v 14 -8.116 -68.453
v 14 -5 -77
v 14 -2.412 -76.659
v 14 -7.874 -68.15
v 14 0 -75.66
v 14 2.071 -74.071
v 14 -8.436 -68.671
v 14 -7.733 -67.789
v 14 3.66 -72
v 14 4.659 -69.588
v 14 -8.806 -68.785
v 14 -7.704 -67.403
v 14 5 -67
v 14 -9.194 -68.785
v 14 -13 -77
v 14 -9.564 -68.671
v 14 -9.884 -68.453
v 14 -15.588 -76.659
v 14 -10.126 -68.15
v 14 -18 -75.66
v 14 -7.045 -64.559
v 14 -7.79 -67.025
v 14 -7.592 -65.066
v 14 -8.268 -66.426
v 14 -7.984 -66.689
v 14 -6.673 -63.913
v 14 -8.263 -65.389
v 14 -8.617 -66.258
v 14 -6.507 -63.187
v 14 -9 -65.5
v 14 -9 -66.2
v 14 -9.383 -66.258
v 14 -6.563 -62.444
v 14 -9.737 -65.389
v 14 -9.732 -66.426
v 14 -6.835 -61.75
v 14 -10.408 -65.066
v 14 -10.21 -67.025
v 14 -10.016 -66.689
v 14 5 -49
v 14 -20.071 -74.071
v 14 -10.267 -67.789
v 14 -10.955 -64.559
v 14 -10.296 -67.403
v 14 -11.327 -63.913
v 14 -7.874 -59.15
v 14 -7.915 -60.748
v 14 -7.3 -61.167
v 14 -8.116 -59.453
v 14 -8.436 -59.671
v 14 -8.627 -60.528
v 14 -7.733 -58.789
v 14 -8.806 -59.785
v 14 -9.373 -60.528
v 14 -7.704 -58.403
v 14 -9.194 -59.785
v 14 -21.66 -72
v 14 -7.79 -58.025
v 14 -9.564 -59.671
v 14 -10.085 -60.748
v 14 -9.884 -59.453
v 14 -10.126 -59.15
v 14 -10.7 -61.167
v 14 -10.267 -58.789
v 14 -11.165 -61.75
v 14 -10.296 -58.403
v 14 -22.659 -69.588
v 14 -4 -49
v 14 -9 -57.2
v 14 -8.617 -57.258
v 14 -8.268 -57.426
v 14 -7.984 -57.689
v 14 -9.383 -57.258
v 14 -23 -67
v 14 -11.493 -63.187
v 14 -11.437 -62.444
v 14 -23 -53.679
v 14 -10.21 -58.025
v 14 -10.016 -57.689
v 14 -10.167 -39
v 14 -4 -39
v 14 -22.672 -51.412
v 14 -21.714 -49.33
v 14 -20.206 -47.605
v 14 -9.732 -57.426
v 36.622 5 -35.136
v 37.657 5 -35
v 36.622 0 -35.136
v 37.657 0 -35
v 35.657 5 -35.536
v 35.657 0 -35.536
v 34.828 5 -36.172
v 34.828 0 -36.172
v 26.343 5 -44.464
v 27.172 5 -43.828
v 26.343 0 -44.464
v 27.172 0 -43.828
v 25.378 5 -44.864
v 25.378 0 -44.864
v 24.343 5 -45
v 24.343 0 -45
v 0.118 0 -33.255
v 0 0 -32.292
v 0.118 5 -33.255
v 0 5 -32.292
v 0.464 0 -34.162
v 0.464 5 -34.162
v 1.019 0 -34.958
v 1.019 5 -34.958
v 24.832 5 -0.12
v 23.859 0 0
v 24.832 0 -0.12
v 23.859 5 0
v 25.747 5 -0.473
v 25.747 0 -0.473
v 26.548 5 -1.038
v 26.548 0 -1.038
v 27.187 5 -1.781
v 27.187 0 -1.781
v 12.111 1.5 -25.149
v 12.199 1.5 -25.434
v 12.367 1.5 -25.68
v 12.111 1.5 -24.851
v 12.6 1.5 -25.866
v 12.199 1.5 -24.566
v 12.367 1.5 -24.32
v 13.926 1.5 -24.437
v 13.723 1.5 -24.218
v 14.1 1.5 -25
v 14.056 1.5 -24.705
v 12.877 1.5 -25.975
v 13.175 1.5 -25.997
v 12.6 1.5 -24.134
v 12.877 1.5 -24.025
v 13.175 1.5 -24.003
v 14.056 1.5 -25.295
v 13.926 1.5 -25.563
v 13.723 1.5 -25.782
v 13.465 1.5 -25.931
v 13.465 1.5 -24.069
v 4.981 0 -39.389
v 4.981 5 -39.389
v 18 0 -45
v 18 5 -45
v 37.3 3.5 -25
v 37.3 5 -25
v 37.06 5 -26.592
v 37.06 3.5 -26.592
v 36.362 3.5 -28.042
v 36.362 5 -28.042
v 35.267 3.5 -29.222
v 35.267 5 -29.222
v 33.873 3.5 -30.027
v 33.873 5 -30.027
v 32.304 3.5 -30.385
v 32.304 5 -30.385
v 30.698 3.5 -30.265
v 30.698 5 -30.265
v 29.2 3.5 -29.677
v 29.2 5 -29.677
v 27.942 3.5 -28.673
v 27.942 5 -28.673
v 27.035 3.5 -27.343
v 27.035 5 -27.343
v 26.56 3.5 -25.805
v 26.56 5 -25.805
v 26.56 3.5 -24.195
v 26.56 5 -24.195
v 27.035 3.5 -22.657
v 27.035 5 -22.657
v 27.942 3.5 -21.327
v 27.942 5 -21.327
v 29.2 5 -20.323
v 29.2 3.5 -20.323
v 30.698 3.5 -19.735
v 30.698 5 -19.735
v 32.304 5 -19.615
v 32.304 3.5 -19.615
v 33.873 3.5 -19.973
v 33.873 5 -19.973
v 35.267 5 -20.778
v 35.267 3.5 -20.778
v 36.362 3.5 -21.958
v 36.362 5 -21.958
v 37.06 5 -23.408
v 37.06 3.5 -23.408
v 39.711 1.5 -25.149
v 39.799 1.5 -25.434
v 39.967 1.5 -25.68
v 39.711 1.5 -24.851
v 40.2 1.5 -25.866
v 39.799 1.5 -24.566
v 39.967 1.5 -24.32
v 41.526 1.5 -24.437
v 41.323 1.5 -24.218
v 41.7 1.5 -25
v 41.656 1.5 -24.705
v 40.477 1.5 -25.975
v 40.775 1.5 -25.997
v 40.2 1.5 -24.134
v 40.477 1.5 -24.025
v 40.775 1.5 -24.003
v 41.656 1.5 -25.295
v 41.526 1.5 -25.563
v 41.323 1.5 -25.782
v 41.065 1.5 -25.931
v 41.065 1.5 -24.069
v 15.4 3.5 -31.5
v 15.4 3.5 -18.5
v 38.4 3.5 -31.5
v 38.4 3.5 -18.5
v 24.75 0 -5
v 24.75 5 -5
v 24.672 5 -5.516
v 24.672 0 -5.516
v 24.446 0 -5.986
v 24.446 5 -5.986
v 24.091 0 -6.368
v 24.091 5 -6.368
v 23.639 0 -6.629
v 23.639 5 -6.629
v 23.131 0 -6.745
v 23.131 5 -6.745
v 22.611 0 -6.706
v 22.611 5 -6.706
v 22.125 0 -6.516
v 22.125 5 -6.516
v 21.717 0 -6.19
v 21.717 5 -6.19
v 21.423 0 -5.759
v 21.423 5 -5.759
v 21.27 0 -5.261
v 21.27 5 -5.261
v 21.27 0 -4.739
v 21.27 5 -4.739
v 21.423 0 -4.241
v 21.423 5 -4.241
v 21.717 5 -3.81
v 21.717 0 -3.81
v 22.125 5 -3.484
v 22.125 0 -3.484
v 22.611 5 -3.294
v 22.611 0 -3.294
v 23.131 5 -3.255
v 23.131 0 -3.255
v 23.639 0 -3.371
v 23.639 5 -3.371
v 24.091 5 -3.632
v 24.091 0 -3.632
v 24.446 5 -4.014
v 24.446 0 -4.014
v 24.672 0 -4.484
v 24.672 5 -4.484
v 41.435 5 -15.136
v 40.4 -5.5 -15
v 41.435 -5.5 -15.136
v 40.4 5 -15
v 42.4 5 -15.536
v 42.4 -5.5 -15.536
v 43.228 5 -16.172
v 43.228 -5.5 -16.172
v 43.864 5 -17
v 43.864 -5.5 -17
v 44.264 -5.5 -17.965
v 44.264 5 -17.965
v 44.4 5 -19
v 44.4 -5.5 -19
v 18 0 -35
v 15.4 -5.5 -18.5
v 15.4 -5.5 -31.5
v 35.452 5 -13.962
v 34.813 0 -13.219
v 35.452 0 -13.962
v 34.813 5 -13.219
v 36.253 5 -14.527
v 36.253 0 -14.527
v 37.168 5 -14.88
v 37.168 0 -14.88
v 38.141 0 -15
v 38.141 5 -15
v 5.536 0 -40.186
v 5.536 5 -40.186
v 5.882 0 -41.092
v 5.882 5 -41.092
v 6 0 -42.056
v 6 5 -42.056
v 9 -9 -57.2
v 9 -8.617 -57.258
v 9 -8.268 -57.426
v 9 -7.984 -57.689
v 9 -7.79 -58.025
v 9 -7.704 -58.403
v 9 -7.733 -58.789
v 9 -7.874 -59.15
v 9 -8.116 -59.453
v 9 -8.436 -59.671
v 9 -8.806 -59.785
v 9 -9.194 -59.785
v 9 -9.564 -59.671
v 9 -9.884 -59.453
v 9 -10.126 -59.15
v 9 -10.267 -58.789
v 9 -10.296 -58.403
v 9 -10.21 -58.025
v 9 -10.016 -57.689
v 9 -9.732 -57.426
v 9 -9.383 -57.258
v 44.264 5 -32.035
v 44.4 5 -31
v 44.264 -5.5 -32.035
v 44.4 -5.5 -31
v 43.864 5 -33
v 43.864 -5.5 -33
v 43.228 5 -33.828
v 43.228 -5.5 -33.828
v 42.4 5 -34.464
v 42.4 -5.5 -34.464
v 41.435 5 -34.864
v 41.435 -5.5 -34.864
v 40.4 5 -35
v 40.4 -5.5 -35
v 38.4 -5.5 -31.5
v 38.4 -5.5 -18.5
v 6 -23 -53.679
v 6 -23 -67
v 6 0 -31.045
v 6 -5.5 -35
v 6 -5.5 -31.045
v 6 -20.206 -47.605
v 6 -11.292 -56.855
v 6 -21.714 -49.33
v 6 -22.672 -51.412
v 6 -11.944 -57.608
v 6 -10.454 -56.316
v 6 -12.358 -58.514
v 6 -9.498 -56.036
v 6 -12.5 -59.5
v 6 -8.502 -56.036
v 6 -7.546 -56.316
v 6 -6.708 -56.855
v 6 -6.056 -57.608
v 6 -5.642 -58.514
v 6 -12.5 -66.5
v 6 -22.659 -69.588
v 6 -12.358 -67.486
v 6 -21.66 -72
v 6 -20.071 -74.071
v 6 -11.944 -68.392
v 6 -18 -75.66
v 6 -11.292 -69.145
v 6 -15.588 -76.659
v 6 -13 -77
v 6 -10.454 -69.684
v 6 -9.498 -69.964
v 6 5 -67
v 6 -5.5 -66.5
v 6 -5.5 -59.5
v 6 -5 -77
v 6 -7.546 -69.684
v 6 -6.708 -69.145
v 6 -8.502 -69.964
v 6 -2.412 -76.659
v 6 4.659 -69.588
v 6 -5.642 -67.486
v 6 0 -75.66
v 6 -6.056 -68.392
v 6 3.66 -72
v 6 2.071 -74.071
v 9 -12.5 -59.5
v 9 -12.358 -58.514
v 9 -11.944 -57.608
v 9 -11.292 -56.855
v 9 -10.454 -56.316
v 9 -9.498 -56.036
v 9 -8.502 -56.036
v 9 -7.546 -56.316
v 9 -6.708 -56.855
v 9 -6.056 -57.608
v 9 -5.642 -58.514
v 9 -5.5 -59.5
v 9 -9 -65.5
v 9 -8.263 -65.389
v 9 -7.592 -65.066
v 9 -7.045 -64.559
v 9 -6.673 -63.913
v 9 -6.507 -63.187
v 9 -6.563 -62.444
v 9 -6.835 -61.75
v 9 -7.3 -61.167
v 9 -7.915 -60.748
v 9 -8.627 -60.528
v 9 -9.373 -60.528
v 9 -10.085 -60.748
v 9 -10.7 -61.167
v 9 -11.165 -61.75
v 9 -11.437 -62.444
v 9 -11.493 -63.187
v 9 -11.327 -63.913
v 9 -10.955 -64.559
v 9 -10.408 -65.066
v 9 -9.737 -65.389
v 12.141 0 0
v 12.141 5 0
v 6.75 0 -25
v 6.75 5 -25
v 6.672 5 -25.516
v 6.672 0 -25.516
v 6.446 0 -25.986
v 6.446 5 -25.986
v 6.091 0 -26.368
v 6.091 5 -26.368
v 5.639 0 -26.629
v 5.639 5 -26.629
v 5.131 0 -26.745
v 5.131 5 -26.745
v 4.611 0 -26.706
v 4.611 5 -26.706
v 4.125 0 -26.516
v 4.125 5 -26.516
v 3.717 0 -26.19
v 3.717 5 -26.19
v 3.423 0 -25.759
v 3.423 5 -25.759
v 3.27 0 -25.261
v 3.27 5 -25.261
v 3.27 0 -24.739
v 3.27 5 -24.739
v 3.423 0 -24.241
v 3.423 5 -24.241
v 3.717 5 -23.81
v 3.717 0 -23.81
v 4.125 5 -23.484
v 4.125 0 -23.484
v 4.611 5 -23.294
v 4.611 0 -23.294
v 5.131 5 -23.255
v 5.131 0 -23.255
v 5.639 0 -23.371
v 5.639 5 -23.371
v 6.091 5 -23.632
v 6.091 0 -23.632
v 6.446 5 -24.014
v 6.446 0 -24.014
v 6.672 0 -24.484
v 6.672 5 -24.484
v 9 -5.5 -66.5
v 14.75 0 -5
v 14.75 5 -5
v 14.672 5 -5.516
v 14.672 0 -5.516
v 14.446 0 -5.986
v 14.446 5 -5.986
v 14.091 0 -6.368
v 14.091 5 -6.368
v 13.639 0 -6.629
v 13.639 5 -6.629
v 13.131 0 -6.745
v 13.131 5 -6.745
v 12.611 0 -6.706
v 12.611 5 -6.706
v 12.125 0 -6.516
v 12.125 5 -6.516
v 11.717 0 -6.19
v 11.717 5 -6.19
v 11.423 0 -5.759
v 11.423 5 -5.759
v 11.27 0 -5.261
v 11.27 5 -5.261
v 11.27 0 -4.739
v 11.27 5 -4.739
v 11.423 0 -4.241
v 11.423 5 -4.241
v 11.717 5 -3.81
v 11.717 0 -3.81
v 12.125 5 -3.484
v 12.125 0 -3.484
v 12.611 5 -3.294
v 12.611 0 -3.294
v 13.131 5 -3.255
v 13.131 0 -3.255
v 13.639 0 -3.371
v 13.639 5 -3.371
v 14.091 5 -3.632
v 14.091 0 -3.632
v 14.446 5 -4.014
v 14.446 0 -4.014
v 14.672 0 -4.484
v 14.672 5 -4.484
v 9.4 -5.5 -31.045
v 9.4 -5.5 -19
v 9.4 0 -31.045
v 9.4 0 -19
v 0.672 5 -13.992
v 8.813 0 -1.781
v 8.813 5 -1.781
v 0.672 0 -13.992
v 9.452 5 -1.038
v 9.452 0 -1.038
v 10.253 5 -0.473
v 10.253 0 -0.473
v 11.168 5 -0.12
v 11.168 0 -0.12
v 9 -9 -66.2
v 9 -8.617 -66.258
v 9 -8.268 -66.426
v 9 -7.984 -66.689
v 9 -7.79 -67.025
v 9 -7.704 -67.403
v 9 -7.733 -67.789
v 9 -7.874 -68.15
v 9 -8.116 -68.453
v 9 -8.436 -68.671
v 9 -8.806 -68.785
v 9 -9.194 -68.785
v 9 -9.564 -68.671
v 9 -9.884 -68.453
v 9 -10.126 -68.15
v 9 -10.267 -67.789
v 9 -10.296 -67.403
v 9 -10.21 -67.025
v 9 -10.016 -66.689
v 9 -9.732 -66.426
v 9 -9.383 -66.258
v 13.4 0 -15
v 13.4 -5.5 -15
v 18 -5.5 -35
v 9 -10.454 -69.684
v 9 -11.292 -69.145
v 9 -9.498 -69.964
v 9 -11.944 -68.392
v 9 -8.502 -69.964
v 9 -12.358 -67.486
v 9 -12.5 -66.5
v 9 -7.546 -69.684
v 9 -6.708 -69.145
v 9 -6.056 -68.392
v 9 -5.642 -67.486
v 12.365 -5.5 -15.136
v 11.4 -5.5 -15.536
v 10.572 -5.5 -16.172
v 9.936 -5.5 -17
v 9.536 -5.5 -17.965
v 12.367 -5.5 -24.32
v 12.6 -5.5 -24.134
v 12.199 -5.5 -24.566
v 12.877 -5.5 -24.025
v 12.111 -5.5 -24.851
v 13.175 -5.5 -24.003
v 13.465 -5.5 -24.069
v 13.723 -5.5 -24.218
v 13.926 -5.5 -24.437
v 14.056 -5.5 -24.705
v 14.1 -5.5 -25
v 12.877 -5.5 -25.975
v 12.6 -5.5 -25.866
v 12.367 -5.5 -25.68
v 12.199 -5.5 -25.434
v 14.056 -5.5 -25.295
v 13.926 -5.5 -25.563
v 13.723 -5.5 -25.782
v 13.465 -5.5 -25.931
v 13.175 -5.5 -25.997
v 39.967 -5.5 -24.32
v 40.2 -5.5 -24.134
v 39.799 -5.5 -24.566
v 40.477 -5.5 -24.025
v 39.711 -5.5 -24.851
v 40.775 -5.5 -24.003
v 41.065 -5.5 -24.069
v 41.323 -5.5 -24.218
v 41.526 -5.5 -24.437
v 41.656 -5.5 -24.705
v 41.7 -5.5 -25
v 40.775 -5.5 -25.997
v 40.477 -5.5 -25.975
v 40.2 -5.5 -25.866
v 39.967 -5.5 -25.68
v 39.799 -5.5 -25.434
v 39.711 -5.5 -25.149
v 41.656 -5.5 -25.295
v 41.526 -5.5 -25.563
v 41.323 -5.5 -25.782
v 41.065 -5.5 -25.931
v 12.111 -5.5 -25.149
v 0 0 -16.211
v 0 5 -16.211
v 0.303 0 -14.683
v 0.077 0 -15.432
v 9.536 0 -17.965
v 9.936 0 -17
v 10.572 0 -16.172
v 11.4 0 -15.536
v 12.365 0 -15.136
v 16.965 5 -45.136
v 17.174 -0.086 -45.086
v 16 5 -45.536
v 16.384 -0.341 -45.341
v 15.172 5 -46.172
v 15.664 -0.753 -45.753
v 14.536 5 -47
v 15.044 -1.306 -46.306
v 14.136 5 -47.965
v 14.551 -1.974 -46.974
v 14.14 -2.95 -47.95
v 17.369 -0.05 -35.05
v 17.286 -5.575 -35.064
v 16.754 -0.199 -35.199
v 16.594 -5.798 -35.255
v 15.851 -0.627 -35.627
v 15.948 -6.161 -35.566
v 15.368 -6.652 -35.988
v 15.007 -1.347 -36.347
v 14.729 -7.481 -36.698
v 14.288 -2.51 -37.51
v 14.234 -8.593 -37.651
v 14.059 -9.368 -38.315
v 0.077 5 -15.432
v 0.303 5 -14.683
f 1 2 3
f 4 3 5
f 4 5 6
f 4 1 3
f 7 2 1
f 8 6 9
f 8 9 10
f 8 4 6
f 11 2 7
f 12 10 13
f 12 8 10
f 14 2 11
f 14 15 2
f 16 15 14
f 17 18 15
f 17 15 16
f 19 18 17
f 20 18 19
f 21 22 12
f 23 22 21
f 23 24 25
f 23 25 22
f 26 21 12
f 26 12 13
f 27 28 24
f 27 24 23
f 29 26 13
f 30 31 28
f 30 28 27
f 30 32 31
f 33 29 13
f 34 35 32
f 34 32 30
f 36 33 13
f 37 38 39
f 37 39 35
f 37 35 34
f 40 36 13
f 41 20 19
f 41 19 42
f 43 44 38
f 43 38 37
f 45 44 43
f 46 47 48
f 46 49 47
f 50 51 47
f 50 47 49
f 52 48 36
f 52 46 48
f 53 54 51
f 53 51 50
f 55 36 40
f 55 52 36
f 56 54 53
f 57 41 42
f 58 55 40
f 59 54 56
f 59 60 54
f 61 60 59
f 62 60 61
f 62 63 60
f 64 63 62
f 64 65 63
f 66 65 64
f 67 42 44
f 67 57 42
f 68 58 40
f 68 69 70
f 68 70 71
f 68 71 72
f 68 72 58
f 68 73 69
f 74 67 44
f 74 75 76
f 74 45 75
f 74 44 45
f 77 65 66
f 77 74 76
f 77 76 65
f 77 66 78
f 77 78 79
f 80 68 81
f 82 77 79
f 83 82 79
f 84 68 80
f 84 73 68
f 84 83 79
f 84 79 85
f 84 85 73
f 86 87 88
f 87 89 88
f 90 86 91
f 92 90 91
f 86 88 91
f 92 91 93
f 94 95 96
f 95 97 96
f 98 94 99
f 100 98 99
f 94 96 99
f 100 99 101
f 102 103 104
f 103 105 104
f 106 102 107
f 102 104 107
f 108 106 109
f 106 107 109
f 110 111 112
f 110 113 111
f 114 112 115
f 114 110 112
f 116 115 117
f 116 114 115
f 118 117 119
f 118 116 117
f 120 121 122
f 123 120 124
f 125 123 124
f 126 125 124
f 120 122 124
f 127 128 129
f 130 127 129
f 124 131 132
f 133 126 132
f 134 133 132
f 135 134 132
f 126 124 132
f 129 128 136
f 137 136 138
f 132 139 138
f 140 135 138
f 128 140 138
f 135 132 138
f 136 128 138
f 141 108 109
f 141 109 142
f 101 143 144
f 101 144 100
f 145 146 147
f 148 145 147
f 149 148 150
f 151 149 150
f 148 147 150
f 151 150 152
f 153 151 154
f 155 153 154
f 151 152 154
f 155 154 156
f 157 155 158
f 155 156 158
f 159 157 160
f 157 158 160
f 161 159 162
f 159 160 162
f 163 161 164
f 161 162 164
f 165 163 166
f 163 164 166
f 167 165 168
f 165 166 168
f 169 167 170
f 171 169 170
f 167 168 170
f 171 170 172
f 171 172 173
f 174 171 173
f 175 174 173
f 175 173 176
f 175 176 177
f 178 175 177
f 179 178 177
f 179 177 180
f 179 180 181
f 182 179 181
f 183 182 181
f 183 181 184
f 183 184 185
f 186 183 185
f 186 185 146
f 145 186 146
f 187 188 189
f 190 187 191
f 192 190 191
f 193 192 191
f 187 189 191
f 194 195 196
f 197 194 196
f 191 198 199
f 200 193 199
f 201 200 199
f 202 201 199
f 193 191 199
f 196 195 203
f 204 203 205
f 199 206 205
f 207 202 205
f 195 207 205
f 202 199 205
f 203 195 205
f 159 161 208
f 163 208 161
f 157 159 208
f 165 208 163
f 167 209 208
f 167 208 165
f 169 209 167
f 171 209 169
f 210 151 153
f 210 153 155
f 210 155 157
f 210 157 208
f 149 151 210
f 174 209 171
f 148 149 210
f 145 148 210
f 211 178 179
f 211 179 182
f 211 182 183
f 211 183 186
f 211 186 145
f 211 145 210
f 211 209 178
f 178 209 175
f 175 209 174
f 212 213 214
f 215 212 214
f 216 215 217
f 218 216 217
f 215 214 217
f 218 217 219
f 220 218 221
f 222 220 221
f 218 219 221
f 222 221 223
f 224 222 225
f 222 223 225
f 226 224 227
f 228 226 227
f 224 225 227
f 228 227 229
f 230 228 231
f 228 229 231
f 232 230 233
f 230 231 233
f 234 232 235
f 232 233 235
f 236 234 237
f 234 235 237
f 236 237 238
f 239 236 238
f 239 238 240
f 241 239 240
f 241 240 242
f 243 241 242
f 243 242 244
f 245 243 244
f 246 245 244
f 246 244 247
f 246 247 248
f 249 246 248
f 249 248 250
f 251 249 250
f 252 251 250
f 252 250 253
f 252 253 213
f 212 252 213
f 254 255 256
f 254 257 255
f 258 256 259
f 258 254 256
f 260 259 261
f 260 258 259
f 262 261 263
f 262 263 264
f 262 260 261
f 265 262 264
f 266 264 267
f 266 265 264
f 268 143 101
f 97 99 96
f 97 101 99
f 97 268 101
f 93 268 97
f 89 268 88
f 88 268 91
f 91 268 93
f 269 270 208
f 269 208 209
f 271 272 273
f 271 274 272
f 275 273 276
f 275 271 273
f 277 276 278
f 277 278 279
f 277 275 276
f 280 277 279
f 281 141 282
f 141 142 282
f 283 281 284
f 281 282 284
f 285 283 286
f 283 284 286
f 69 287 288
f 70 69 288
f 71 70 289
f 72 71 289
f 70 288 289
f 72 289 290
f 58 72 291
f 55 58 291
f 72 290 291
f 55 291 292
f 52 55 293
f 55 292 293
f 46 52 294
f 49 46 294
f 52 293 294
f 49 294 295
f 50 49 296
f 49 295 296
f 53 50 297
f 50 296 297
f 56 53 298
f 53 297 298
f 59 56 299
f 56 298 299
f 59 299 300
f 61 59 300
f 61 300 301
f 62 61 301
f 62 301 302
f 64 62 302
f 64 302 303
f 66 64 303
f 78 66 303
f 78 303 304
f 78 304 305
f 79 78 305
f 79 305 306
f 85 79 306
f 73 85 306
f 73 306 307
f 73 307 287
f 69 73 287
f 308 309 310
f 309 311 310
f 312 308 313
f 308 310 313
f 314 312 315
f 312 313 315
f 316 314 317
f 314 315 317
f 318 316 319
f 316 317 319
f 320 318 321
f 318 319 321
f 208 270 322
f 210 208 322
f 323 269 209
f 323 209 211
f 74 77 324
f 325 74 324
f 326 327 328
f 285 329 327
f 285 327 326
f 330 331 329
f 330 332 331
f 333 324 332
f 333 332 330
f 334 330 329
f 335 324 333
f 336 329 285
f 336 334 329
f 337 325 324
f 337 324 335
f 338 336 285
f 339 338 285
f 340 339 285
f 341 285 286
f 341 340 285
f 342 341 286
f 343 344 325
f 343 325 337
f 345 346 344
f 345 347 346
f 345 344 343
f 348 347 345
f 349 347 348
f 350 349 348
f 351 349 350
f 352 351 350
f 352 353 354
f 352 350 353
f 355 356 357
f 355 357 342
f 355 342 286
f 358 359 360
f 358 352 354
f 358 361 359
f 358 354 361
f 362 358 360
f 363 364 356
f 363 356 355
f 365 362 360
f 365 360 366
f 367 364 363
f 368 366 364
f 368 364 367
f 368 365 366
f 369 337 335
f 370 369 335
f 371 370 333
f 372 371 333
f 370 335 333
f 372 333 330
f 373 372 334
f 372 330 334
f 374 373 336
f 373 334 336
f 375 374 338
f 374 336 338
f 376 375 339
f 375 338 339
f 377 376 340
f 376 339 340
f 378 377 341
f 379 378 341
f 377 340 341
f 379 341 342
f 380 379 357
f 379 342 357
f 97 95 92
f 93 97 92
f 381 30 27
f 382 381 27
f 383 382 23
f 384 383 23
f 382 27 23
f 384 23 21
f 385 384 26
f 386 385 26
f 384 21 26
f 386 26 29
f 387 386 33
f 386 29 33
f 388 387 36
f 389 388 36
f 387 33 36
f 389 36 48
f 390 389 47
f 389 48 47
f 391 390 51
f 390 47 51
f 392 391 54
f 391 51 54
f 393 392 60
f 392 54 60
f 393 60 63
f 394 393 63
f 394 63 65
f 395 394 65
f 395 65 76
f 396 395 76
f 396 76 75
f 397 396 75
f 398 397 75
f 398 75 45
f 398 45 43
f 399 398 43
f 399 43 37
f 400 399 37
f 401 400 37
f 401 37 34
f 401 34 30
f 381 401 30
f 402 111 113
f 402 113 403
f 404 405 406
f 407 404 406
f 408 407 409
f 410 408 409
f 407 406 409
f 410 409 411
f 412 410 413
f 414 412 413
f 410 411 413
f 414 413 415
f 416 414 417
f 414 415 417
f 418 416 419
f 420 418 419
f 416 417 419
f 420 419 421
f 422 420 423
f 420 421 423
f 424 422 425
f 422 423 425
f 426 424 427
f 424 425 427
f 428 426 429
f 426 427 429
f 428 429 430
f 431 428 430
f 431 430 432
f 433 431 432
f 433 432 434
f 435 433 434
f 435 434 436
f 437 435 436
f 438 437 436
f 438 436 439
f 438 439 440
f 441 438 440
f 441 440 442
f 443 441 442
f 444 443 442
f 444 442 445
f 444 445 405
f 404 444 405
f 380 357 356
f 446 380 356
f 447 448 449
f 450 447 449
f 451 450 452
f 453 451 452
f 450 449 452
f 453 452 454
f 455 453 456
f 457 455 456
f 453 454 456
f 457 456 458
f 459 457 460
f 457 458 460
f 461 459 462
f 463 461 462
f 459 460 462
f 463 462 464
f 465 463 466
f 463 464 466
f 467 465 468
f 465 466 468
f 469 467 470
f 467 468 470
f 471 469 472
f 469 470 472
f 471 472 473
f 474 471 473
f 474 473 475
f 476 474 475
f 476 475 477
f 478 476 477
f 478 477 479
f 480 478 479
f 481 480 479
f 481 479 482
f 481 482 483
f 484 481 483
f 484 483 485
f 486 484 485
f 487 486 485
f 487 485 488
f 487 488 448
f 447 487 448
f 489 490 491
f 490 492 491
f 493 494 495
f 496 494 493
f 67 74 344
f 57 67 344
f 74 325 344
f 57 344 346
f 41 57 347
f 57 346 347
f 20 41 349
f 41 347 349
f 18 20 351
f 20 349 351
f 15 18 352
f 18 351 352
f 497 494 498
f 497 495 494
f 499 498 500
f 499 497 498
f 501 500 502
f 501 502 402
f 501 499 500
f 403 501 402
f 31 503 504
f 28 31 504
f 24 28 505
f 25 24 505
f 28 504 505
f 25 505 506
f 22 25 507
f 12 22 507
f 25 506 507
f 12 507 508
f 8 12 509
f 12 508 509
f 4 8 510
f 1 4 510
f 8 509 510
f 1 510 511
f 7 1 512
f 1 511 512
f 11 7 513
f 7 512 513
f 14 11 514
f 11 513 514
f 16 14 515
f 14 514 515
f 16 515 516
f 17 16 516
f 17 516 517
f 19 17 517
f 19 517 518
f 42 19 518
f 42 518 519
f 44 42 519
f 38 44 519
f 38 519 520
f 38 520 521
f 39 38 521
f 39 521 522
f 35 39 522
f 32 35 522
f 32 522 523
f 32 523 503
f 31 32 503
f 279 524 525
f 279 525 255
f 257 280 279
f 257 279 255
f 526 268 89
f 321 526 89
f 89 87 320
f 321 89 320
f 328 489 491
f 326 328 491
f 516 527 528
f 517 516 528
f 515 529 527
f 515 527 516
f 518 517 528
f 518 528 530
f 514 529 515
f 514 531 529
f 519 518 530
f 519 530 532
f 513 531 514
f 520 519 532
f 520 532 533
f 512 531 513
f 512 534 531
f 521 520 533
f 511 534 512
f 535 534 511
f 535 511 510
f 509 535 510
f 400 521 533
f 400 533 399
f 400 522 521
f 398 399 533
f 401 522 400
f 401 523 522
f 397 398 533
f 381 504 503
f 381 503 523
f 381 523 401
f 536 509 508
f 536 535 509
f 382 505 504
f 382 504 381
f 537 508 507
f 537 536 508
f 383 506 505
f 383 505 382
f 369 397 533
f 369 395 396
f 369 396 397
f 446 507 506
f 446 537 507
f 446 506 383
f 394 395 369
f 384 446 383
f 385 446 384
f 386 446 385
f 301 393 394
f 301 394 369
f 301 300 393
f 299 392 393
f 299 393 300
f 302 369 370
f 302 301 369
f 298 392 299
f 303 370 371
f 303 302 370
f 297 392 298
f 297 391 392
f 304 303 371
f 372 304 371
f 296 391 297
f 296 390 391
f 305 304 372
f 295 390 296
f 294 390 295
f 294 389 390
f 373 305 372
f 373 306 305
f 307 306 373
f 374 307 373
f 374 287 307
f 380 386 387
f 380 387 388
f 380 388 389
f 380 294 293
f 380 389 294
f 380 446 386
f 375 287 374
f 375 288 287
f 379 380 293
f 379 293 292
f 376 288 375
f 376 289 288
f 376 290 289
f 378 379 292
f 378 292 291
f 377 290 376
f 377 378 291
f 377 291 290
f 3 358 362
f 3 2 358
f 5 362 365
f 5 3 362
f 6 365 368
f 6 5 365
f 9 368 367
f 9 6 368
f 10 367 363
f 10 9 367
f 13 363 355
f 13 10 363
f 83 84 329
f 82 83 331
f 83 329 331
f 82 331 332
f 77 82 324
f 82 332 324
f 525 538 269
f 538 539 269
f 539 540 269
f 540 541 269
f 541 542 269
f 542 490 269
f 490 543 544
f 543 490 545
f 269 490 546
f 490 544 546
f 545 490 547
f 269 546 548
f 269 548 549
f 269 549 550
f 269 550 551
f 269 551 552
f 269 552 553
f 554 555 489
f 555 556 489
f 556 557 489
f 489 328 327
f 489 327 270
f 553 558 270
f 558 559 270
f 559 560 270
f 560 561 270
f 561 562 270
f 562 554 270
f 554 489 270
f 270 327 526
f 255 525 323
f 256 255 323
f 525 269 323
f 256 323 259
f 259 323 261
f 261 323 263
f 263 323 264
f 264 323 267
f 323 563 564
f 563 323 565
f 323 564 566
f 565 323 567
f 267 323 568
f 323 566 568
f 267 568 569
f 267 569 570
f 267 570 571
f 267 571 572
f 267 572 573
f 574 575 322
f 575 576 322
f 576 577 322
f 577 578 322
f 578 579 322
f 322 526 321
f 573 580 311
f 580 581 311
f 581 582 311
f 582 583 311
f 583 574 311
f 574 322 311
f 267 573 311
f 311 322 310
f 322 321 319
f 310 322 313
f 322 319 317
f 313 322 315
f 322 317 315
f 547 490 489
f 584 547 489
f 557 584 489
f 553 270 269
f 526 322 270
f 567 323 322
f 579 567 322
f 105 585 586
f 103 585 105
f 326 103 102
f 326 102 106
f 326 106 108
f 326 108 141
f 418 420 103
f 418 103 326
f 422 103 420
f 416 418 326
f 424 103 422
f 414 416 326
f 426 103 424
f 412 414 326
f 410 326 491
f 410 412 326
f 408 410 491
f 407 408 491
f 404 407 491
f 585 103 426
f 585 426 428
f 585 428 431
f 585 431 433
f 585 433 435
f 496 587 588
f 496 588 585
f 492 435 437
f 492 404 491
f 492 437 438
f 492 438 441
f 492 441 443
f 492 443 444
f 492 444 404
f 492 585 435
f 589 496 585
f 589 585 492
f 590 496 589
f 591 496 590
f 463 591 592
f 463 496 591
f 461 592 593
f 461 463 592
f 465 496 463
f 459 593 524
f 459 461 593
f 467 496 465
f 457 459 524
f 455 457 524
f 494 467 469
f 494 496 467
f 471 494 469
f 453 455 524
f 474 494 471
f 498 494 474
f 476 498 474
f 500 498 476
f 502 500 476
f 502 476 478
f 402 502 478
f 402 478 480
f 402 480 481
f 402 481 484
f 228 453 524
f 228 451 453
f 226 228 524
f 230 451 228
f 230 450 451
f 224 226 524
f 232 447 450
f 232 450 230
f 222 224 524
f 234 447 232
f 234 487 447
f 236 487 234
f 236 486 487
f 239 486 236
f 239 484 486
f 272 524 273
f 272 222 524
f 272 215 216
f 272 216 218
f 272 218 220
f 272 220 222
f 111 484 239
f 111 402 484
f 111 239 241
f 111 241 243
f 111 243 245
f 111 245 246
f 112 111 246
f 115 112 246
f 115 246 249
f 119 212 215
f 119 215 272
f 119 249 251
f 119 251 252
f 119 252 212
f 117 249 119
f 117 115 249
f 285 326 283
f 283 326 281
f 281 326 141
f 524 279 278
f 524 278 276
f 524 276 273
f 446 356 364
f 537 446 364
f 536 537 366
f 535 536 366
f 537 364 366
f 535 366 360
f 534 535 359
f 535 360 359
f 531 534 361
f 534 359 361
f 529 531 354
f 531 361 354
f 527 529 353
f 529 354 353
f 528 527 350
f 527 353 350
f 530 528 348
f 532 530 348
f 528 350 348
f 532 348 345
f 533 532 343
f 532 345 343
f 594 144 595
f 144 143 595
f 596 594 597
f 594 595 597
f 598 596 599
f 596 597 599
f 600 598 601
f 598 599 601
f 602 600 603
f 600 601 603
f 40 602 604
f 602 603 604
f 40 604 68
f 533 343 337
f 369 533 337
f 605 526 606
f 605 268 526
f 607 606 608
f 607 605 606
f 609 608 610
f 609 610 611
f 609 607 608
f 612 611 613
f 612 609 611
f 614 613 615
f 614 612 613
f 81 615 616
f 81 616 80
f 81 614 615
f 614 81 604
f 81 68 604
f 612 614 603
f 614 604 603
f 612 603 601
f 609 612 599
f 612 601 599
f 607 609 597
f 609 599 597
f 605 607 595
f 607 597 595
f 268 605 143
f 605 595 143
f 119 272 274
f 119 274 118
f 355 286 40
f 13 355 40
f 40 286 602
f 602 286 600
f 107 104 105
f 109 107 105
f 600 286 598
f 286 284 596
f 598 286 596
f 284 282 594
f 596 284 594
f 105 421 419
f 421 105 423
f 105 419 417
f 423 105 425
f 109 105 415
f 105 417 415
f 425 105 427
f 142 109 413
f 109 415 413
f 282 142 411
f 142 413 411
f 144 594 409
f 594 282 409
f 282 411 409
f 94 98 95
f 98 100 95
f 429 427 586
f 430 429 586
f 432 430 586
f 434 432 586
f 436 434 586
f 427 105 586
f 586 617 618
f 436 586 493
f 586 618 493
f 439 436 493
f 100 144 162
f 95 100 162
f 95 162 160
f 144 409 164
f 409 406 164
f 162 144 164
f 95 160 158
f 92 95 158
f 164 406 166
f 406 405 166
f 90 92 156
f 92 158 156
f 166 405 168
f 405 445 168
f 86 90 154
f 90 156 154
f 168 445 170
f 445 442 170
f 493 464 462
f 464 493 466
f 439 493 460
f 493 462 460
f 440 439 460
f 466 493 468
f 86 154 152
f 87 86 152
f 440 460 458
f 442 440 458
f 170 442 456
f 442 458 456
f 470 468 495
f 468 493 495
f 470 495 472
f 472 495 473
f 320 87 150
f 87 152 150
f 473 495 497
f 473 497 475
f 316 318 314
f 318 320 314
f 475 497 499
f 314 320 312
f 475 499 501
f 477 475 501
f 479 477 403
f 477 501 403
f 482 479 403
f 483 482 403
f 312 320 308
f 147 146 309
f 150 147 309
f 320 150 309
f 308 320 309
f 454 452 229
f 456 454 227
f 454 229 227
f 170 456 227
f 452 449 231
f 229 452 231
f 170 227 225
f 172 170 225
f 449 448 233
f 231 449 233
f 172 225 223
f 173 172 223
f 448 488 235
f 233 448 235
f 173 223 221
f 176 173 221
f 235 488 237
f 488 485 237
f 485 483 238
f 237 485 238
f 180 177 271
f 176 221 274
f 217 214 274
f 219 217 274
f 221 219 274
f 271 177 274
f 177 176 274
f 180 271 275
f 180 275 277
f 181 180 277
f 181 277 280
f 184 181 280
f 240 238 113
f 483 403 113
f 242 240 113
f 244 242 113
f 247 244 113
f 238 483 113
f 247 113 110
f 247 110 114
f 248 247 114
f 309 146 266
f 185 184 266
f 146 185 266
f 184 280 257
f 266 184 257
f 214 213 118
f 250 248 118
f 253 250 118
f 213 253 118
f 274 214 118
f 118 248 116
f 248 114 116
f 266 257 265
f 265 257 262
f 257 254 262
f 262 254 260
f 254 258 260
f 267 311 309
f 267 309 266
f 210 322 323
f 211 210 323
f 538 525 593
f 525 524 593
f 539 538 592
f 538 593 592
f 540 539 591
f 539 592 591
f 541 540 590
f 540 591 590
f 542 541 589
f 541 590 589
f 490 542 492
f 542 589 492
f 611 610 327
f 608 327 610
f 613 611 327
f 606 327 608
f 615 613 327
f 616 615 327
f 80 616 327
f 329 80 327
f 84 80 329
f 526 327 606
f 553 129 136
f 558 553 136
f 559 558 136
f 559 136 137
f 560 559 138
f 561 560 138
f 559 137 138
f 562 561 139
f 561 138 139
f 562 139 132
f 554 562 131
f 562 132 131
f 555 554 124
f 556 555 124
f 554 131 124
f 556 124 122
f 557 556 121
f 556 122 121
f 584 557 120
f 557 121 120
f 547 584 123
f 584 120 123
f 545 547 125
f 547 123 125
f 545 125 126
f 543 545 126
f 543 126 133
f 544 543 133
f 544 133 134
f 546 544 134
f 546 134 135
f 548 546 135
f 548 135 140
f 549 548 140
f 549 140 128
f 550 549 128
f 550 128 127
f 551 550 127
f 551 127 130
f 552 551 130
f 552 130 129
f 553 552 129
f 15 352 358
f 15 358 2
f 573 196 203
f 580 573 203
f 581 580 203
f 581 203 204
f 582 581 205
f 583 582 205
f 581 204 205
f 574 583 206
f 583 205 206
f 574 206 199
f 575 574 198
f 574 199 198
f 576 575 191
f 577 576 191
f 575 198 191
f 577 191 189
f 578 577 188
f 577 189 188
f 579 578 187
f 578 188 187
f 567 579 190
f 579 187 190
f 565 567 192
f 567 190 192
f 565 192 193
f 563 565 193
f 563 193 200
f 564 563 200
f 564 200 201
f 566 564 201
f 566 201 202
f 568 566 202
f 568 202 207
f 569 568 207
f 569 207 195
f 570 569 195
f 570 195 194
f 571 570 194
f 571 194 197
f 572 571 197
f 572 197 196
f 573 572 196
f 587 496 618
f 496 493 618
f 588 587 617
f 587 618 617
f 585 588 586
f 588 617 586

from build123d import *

# Parameters (mm, degrees)
BOSS_EXTRUDE1_DEPTH            = 38.4
SKETCH2_W                      = 38.4
SKETCH2_H                      = 15
BOSS_EXTRUDE2_DEPTH            = 5.5
SKETCH3_W                      = 38.4
SKETCH3_H                      = 23
BOSS_EXTRUDE3_DEPTH            = 27
SKETCH8_W                      = 38.4
SKETCH8_H                      = 5.5
BOSS_EXTRUDE4_DEPTH            = 20
CUT_EXTRUDE1_DEPTH             = 30.4
SKETCH10_W                     = 30.4
SKETCH10_H                     = 5.5
CUT_EXTRUDE2_DEPTH             = 32
BOSS_EXTRUDE5_DEPTH            = 5
CUT_EXTRUDE3_REACH             = 89.653
SKETCH17_W                     = 16.045256013
SKETCH17_H                     = 5.5
CUT_EXTRUDE4_DEPTH             = 94.189913617
CUT_EXTRUDE5_DEPTH             = 5.5
CUT_EXTRUDE6_DEPTH             = 3
SKETCH34_W                     = 23
SKETCH34_H                     = 13
CUT_EXTRUDE7_DEPTH             = 9
F_3_5_3_5_DIAMETER_HOLE1_D     = 3.5
F_10_8_10_8_DIAMETER_HOLE1_D   = 10.8
F_5_0_5_DIAMETER_HOLE1_D       = 5
F_5_0_5_DIAMETER_HOLE1_DEPTH   = 35.4
F_2_6_2_6_DIAMETER_HOLE1_D     = 2.6
F_2_6_2_6_DIAMETER_HOLE1_DEPTH = 14
F_2_0_2_DIAMETER_HOLE1_D       = 2
F_2_0_2_DIAMETER_HOLE1_DEPTH   = 7
FILLET1_R                      = 4
FILLET2_R                      = 8
FILLET3_R                      = 10


with BuildPart() as part:
    # Sketch1 → Boss-Extrude1 (new body)
    with BuildSketch(Plane(origin=(44.4, 0, 0), x_dir=(0, 0, -1), z_dir=(1, 0, 0))):
        Polygon((50, -5.5), (35, -5.5), (50, -23), align=None)
    extrude(amount=-BOSS_EXTRUDE1_DEPTH)

    # Sketch2 → Boss-Extrude2 (add)
    with BuildSketch(Plane(origin=(0, -5.5, 0), x_dir=(-1, 0, 0), z_dir=(0, 1, 0))):
        with Locations((-25.2, -42.5)):
            Rectangle(SKETCH2_W, SKETCH2_H)
    extrude(amount=BOSS_EXTRUDE2_DEPTH)

    # Sketch3 → Boss-Extrude3 (add)
    with BuildSketch(Plane(origin=(0, 0, -50), x_dir=(-1, 0, 0), z_dir=(0, 0, -1))):
        with Locations((-25.2, -11.5)):
            Rectangle(SKETCH3_W, SKETCH3_H)
    extrude(amount=BOSS_EXTRUDE3_DEPTH)

    # Sketch8 → Boss-Extrude4 (add)
    with BuildSketch(Plane.XY.offset(-35)):
        with Locations((25.2, -2.75)):
            Rectangle(SKETCH8_W, SKETCH8_H)
    extrude(amount=BOSS_EXTRUDE4_DEPTH)

    # Sketch9 → Cut-Extrude1 (cut)
    with BuildSketch(Plane(origin=(44.4, 0, 0), x_dir=(0, 0, -1), z_dir=(1, 0, 0))):
        Polygon((77, -23), (77, -5.5), (35, -5.5), (50, -23), align=None)
    extrude(amount=-CUT_EXTRUDE1_DEPTH, mode=Mode.SUBTRACT)

    # Sketch10 → Cut-Extrude2 (cut)
    with BuildSketch(Plane(origin=(0, 0, -77), x_dir=(-1, 0, 0), z_dir=(0, 0, -1))):
        with Locations((-29.2, -2.75)):
            Rectangle(SKETCH10_W, SKETCH10_H)
    extrude(amount=-CUT_EXTRUDE2_DEPTH, mode=Mode.SUBTRACT)

    # Sketch11 → Boss-Extrude5 (add)
    with BuildSketch(Plane(origin=(0, 0, 0), x_dir=(-1, 0, 0), z_dir=(0, 1, 0))):
        Polygon((-10, 0), (0, -15), (0, -33.819660113), (-6, -40.527864045), (-6, -77), (-14, -77), (-14, -45), (-44.4, -45), (-44.4, -15), (-36, -15), (-26, 0), align=None)
    extrude(amount=BOSS_EXTRUDE5_DEPTH)

    # Sketch17 → Cut-Extrude3 (cut, up to next)
    with BuildSketch(Plane(origin=(9.4, 0, 0), x_dir=(0, 0, -1), z_dir=(1, 0, 0)), mode=Mode.PRIVATE) as cut_extrude3_sk1:
        with Locations((23.022628007, -2.75)):
            Rectangle(SKETCH17_W, SKETCH17_H)
    cut_extrude3_tool1 = extrude(cut_extrude3_sk1.sketch, amount=-CUT_EXTRUDE3_REACH, mode=Mode.PRIVATE) & part.part
    add(cut_extrude3_tool1.solids().sort_by_distance((9.4, -2.75, -23.022628))[0], mode=Mode.SUBTRACT)

    # Sketch24 → Cut-Extrude4 (cut, through all)
    with BuildSketch(Plane(origin=(0, 5, 0), x_dir=(-1, 0, 0), z_dir=(0, 1, 0))):
        Polygon((-36, -35), (-44.4, -35), (-44.4, -45), (-26, -45), align=None)
    extrude(amount=-CUT_EXTRUDE4_DEPTH, mode=Mode.SUBTRACT)

    # Sketch25 → Cut-Extrude5 (cut)
    with BuildSketch(Plane.XZ.offset(5.5)):
        Polygon((36, -35), (14, -35), (14, -45), (26, -45), align=None)
    extrude(amount=-CUT_EXTRUDE5_DEPTH, mode=Mode.SUBTRACT)

    # Sketch33 → Cut-Extrude6 (cut)
    with BuildSketch(Plane.ZY.offset(-6)):
        with BuildLine():
            Line((-66.5, -12.5), (-59.5, -12.5))
            ThreePointArc((-59.5, -12.5), (-56, -9), (-59.5, -5.5))
            Line((-59.5, -5.5), (-66.5, -5.5))
            ThreePointArc((-66.5, -5.5), (-70, -9), (-66.5, -12.5))
        make_face()
    extrude(amount=-CUT_EXTRUDE6_DEPTH, mode=Mode.SUBTRACT)

    # Sketch34 → Cut-Extrude7 (cut)
    with BuildSketch(Plane.XZ.offset(5.5)):
        with Locations((26.9, -25)):
            Rectangle(SKETCH34_W, SKETCH34_H)
    extrude(amount=-CUT_EXTRUDE7_DEPTH, mode=Mode.SUBTRACT)

    # Ø3.5 (3.5) Diameter Hole1 (through all)
    with Locations(Plane(origin=(0, 0, 0), x_dir=(-1, 0, 0), z_dir=(0, -1, 0))):
        with Locations((-5, 25), (-13, 5), (-23, 5)):
            Hole(F_3_5_3_5_DIAMETER_HOLE1_D / 2)

    # Ø10.8 (10.8) Diameter Hole1 (through all)
    with Locations(Plane(origin=(0, 3.5, 0), x_dir=(-1, 0, 0), z_dir=(0, -1, 0))):
        with Locations((-31.9, 25)):
            Hole(F_10_8_10_8_DIAMETER_HOLE1_D / 2)

    # Ø5.0 (5) Diameter Hole1
    with Locations(Plane.ZY.offset(-9)):
        with Locations((-63, -9)):
            Hole(F_5_0_5_DIAMETER_HOLE1_D / 2, depth=F_5_0_5_DIAMETER_HOLE1_DEPTH)

    # Ø2.6 (2.6) Diameter Hole1
    with Locations(Plane(origin=(14, 0, 0), x_dir=(0, 0, -1), z_dir=(1, 0, 0))):
        with Locations((58.5, -9), (67.5, -9)):
            Hole(F_2_6_2_6_DIAMETER_HOLE1_D / 2, depth=F_2_6_2_6_DIAMETER_HOLE1_DEPTH)

    # Ø2.0 (2) Diameter Hole1
    with Locations(Plane(origin=(0, -5.5, 0), x_dir=(-1, 0, 0), z_dir=(0, -1, 0))):
        with Locations((-13.1, 25), (-40.7, 25)):
            Hole(F_2_0_2_DIAMETER_HOLE1_D / 2, depth=F_2_0_2_DIAMETER_HOLE1_DEPTH)

    # Fillet1
    fillet1_edges = [part.edges().sort_by_distance(p)[0] for p in [
        (9.4, -2.75, -15),
        (44.4, -0.25, -35),
        (36, 2.5, -35),
        (26, 2.5, -45),
        (14, 2.5, -45),
        (14, 0, -40),
        (14, -2.75, -35),
        (44.4, -0.25, -15),
        (10, 2.5, 0),
        (26, 2.5, 0),
        (36, 2.5, -15),
        (6, 2.5, -40.527864045),
        (0, 2.5, -33.819660113),
        (0, 2.5, -15),
    ]]
    fillet(fillet1_edges, radius=FILLET1_R)

    # Fillet2
    fillet2_edges = [part.edges().sort_by_distance(p)[0] for p in [
        (10, -23, -50),
    ]]
    fillet(fillet2_edges, radius=FILLET2_R)

    # Fillet3
    fillet3_edges = [part.edges().sort_by_distance(p)[0] for p in [
        (10, -23, -77),
        (10, 5, -77),
    ]]
    fillet(fillet3_edges, radius=FILLET3_R)


solid = part.part
